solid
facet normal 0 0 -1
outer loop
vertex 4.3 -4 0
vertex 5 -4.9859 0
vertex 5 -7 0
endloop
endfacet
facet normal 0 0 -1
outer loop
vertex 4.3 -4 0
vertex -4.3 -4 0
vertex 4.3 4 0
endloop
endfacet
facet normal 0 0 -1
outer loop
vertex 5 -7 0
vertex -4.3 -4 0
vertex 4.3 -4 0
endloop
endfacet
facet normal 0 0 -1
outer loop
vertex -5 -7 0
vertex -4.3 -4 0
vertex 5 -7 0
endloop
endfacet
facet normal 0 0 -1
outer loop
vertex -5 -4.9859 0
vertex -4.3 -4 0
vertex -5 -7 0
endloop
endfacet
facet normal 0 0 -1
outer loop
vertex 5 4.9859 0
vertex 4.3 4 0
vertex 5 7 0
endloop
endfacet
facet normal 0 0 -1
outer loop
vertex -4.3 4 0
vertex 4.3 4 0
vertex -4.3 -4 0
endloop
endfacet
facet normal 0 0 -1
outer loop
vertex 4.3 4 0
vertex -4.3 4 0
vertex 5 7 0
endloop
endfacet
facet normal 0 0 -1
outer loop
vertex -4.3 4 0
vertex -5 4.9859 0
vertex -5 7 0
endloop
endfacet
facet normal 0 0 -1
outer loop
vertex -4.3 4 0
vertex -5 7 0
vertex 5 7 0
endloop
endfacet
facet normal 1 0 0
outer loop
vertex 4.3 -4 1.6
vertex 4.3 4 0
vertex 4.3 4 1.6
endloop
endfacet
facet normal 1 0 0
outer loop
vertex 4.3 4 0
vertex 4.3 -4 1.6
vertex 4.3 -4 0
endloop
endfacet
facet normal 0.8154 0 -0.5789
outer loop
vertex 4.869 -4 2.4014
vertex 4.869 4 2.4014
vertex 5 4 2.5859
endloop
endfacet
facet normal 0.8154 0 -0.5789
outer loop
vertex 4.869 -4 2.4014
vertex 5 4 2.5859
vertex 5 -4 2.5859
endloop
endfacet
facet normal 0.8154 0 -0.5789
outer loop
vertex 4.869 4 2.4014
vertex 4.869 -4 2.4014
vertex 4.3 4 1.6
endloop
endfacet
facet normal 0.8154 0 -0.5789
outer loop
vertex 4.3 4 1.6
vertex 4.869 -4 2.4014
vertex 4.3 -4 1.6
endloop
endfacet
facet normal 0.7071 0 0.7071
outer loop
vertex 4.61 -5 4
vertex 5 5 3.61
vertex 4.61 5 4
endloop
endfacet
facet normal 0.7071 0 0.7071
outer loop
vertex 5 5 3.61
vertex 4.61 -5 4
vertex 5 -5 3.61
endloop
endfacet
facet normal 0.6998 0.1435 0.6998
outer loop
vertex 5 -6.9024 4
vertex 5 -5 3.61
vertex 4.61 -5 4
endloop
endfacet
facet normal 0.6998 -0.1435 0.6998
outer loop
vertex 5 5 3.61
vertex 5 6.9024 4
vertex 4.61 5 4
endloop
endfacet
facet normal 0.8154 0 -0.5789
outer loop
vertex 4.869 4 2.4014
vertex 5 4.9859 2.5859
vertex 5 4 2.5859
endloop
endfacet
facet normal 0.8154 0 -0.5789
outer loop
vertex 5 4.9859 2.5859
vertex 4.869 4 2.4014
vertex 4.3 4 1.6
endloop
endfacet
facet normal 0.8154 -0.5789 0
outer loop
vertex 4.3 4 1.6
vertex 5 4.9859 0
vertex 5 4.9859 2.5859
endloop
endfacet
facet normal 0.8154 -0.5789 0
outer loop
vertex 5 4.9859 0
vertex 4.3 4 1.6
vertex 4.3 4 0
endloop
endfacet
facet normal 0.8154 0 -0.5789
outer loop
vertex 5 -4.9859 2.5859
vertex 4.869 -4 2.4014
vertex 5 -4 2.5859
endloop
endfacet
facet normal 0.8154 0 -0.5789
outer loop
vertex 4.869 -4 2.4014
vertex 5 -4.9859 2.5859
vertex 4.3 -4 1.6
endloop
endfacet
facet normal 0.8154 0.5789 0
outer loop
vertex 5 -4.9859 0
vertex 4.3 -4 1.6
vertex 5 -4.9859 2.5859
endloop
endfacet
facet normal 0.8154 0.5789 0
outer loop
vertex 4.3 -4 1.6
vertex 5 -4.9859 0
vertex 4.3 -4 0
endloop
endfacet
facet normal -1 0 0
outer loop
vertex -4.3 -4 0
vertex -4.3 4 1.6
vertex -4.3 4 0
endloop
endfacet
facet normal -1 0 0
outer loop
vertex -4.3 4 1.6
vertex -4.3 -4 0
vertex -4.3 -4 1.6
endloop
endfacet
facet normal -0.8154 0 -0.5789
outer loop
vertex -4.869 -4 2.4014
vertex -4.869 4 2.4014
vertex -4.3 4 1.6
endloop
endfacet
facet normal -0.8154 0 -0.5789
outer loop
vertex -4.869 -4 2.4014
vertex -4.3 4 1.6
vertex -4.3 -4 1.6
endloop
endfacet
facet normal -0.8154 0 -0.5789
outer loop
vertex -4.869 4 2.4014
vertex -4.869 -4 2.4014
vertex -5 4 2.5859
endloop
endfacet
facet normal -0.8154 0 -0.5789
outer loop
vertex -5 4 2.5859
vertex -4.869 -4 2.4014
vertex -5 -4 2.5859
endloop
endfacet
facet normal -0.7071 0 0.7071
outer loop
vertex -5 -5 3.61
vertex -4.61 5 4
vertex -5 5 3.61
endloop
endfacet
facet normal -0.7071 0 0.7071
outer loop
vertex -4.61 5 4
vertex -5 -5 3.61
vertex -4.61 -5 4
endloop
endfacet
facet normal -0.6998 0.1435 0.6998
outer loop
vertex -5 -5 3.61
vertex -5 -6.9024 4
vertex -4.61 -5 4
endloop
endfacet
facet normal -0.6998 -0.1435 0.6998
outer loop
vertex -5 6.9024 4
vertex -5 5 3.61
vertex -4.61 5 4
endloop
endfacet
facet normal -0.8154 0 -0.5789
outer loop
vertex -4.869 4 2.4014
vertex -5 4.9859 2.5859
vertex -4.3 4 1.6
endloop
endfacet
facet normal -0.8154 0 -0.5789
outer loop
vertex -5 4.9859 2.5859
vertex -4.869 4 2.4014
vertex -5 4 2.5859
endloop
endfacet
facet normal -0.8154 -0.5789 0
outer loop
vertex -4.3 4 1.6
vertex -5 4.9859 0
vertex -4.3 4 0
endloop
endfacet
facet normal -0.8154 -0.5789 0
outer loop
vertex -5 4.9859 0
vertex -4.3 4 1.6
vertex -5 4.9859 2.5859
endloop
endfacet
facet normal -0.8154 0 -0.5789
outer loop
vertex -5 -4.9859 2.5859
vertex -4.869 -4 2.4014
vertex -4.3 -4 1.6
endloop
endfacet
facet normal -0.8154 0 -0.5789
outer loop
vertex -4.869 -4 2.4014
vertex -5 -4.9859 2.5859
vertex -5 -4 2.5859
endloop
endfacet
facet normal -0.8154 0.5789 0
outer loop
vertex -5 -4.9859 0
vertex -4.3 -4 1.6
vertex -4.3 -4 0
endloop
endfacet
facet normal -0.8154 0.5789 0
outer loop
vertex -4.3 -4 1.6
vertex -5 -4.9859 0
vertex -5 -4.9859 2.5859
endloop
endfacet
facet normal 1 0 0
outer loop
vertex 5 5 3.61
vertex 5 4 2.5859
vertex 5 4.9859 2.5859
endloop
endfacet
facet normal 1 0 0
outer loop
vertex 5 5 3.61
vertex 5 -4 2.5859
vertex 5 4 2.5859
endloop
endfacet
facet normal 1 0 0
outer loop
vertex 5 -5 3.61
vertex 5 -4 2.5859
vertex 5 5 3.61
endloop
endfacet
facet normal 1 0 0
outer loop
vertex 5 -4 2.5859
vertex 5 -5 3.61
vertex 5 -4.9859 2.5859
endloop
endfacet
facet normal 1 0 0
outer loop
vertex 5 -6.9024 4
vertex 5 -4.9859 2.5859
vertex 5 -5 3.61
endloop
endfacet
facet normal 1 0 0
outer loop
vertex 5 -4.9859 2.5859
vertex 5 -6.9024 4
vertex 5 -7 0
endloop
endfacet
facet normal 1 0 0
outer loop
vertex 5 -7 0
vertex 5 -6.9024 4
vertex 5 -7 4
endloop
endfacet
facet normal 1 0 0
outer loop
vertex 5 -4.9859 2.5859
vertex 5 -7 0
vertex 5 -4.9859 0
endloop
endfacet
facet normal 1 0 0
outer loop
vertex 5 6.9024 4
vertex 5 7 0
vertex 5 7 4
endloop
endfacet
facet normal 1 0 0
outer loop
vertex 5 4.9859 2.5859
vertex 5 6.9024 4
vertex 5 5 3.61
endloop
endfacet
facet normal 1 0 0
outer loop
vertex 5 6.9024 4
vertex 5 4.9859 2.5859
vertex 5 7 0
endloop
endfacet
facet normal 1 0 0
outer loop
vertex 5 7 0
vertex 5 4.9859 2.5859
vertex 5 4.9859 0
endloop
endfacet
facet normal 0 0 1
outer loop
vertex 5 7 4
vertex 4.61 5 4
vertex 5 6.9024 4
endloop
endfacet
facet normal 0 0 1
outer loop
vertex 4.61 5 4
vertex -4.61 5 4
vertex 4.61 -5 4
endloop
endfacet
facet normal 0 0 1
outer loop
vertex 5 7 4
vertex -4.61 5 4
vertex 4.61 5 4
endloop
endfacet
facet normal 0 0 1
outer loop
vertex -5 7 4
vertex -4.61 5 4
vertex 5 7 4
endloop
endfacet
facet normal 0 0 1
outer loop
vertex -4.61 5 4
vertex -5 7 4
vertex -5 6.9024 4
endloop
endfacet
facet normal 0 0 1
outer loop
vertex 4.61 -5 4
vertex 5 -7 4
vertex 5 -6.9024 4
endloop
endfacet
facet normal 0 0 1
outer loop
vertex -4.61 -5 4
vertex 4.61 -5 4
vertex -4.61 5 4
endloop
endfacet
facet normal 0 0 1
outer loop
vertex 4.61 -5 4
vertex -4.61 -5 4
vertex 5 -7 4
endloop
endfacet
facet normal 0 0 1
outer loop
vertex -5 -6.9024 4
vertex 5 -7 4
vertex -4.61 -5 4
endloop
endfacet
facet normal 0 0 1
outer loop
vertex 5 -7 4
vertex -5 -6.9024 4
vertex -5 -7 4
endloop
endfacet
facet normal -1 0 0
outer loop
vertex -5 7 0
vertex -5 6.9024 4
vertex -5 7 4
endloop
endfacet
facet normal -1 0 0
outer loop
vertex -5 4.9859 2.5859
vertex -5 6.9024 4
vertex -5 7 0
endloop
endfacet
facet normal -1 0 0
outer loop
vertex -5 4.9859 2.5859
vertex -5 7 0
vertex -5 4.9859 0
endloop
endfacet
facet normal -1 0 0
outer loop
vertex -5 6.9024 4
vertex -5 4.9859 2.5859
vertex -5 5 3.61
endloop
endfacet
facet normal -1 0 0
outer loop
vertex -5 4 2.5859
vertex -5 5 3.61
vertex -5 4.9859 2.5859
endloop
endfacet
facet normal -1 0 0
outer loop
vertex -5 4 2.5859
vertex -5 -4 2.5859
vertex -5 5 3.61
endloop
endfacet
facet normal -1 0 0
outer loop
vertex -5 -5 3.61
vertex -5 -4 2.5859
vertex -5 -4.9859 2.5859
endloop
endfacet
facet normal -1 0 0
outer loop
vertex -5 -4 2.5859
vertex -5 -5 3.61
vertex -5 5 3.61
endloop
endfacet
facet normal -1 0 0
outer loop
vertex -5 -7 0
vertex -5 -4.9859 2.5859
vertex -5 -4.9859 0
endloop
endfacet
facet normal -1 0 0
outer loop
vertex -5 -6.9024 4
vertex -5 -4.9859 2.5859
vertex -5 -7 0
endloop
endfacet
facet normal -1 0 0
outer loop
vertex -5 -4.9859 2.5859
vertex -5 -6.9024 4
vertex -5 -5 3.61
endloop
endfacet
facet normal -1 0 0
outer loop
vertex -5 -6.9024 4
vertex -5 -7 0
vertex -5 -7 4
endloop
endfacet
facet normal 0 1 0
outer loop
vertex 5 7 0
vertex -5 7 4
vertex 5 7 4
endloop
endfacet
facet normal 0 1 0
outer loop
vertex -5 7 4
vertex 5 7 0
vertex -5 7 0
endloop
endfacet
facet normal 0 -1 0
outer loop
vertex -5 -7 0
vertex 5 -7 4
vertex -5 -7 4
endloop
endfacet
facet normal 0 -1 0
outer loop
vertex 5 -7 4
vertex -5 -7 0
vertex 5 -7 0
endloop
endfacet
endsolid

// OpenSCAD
// file: ../lib/BOSL2/std.scad
// Minimal BOSL2 compatibility shim for bundled gallery models.
// It implements only the helpers used by the imported OpenSCAD projects.

CENTER = [0, 0, 0];
BOTTOM = [0, 0, -1];
TOP = [0, 0, 1];
LEFT = [-1, 0, 0];
RIGHT = [1, 0, 0];
FRONT = [0, -1, 0];
BACK = [0, 1, 0];

module up(z=0) {
    translate([0, 0, z]) children();
}

module down(z=0) {
    translate([0, 0, -z]) children();
}

module attach(anchor=CENTER) {
    children();
}

module cuboid(size=[1, 1, 1], anchor=CENTER) {
    center = anchor == CENTER;
    translate(center ? [0, 0, 0] : [0, 0, size[2] / 2])
        cube(size, center=true);
    children();
}

module xcyl(h=1, r=1, anchor=CENTER) {
    center = anchor == CENTER;
    translate(center ? [0, 0, 0] : [h / 2, 0, 0])
        rotate([0, 90, 0])
            cylinder(h=h, r=r, center=true);
}
// file: ../components/node-receiver/BOSL2/std.scad
// Minimal BOSL2 compatibility shim for bundled gallery models.
// It implements only the helpers used by the imported OpenSCAD projects.

CENTER = [0, 0, 0];
BOTTOM = [0, 0, -1];
TOP = [0, 0, 1];
LEFT = [-1, 0, 0];
RIGHT = [1, 0, 0];
FRONT = [0, -1, 0];
BACK = [0, 1, 0];

module up(z=0) {
    translate([0, 0, z]) children();
}

module down(z=0) {
    translate([0, 0, -z]) children();
}

module attach(anchor=CENTER) {
    children();
}

module cuboid(size=[1, 1, 1], anchor=CENTER) {
    center = anchor == CENTER;
    translate(center ? [0, 0, 0] : [0, 0, size[2] / 2])
        cube(size, center=true);
    children();
}

module xcyl(h=1, r=1, anchor=CENTER) {
    center = anchor == CENTER;
    translate(center ? [0, 0, 0] : [h / 2, 0, 0])
        rotate([0, 90, 0])
            cylinder(h=h, r=r, center=true);
}
// file: ../components/node-receiver/node_receiver.scad
// SPDX-License-Identifier: CC-BY-NC-SA-4.0
//
// Primary experiment-owned fixed-side design object.

include <BOSL2/std.scad>

$fn = 120;

use <../../lib/node_interface.scad>

module node_receiver_build(mm_pattern = false) {
    node_receiver(mm_pattern);
}



// -----------------------------------------------------------------------------
// Design-documentation construction states
// -----------------------------------------------------------------------------
// The design evidence follows the same construction as production:
// one source-derived X/Z profile, then one straight BOSL2 path extrusion.

module _node_receiver_design_center_y_slice() {
    translate([
        -node_receiver_width(),
        -0.5,
        -1
    ])
        cube([
            2 * node_receiver_width(),
            1.0,
            node_receiver_height() + 2
        ]);
}

module node_receiver_design_profile() {
    intersection() {
        node_receiver_build(false);
        _node_receiver_design_center_y_slice();
    }
}

module node_receiver_design_profile_vs_extrusion() {
    translate([-8, 0, 0])
        node_receiver_design_profile();

    translate([8, 0, 0])
        node_receiver_build(false);
}

module node_receiver_design_plain() {
    node_receiver_build(false);
}

module node_receiver_design_pattern_cutters() {
    _node_mm_reference_cuts_at_top(
        node_receiver_height(),
        node_receiver_width(),
        node_receiver_length()
    );
}

// Standalone opening shows the primary receiver object.
node_receiver_build();
// file: BOSL2/std.scad
// Minimal BOSL2 compatibility shim for bundled gallery models.
// It implements only the helpers used by the imported OpenSCAD projects.

CENTER = [0, 0, 0];
BOTTOM = [0, 0, -1];
TOP = [0, 0, 1];
LEFT = [-1, 0, 0];
RIGHT = [1, 0, 0];
FRONT = [0, -1, 0];
BACK = [0, 1, 0];

module up(z=0) {
    translate([0, 0, z]) children();
}

module down(z=0) {
    translate([0, 0, -z]) children();
}

module attach(anchor=CENTER) {
    children();
}

module cuboid(size=[1, 1, 1], anchor=CENTER) {
    center = anchor == CENTER;
    translate(center ? [0, 0, 0] : [0, 0, size[2] / 2])
        cube(size, center=true);
    children();
}

module xcyl(h=1, r=1, anchor=CENTER) {
    center = anchor == CENTER;
    translate(center ? [0, 0, 0] : [h / 2, 0, 0])
        rotate([0, 90, 0])
            cylinder(h=h, r=r, center=true);
}
// main file
include <BOSL2/std.scad>

$fn = 120;
use <../components/node-receiver/node_receiver.scad>

node_receiver_build(false);
